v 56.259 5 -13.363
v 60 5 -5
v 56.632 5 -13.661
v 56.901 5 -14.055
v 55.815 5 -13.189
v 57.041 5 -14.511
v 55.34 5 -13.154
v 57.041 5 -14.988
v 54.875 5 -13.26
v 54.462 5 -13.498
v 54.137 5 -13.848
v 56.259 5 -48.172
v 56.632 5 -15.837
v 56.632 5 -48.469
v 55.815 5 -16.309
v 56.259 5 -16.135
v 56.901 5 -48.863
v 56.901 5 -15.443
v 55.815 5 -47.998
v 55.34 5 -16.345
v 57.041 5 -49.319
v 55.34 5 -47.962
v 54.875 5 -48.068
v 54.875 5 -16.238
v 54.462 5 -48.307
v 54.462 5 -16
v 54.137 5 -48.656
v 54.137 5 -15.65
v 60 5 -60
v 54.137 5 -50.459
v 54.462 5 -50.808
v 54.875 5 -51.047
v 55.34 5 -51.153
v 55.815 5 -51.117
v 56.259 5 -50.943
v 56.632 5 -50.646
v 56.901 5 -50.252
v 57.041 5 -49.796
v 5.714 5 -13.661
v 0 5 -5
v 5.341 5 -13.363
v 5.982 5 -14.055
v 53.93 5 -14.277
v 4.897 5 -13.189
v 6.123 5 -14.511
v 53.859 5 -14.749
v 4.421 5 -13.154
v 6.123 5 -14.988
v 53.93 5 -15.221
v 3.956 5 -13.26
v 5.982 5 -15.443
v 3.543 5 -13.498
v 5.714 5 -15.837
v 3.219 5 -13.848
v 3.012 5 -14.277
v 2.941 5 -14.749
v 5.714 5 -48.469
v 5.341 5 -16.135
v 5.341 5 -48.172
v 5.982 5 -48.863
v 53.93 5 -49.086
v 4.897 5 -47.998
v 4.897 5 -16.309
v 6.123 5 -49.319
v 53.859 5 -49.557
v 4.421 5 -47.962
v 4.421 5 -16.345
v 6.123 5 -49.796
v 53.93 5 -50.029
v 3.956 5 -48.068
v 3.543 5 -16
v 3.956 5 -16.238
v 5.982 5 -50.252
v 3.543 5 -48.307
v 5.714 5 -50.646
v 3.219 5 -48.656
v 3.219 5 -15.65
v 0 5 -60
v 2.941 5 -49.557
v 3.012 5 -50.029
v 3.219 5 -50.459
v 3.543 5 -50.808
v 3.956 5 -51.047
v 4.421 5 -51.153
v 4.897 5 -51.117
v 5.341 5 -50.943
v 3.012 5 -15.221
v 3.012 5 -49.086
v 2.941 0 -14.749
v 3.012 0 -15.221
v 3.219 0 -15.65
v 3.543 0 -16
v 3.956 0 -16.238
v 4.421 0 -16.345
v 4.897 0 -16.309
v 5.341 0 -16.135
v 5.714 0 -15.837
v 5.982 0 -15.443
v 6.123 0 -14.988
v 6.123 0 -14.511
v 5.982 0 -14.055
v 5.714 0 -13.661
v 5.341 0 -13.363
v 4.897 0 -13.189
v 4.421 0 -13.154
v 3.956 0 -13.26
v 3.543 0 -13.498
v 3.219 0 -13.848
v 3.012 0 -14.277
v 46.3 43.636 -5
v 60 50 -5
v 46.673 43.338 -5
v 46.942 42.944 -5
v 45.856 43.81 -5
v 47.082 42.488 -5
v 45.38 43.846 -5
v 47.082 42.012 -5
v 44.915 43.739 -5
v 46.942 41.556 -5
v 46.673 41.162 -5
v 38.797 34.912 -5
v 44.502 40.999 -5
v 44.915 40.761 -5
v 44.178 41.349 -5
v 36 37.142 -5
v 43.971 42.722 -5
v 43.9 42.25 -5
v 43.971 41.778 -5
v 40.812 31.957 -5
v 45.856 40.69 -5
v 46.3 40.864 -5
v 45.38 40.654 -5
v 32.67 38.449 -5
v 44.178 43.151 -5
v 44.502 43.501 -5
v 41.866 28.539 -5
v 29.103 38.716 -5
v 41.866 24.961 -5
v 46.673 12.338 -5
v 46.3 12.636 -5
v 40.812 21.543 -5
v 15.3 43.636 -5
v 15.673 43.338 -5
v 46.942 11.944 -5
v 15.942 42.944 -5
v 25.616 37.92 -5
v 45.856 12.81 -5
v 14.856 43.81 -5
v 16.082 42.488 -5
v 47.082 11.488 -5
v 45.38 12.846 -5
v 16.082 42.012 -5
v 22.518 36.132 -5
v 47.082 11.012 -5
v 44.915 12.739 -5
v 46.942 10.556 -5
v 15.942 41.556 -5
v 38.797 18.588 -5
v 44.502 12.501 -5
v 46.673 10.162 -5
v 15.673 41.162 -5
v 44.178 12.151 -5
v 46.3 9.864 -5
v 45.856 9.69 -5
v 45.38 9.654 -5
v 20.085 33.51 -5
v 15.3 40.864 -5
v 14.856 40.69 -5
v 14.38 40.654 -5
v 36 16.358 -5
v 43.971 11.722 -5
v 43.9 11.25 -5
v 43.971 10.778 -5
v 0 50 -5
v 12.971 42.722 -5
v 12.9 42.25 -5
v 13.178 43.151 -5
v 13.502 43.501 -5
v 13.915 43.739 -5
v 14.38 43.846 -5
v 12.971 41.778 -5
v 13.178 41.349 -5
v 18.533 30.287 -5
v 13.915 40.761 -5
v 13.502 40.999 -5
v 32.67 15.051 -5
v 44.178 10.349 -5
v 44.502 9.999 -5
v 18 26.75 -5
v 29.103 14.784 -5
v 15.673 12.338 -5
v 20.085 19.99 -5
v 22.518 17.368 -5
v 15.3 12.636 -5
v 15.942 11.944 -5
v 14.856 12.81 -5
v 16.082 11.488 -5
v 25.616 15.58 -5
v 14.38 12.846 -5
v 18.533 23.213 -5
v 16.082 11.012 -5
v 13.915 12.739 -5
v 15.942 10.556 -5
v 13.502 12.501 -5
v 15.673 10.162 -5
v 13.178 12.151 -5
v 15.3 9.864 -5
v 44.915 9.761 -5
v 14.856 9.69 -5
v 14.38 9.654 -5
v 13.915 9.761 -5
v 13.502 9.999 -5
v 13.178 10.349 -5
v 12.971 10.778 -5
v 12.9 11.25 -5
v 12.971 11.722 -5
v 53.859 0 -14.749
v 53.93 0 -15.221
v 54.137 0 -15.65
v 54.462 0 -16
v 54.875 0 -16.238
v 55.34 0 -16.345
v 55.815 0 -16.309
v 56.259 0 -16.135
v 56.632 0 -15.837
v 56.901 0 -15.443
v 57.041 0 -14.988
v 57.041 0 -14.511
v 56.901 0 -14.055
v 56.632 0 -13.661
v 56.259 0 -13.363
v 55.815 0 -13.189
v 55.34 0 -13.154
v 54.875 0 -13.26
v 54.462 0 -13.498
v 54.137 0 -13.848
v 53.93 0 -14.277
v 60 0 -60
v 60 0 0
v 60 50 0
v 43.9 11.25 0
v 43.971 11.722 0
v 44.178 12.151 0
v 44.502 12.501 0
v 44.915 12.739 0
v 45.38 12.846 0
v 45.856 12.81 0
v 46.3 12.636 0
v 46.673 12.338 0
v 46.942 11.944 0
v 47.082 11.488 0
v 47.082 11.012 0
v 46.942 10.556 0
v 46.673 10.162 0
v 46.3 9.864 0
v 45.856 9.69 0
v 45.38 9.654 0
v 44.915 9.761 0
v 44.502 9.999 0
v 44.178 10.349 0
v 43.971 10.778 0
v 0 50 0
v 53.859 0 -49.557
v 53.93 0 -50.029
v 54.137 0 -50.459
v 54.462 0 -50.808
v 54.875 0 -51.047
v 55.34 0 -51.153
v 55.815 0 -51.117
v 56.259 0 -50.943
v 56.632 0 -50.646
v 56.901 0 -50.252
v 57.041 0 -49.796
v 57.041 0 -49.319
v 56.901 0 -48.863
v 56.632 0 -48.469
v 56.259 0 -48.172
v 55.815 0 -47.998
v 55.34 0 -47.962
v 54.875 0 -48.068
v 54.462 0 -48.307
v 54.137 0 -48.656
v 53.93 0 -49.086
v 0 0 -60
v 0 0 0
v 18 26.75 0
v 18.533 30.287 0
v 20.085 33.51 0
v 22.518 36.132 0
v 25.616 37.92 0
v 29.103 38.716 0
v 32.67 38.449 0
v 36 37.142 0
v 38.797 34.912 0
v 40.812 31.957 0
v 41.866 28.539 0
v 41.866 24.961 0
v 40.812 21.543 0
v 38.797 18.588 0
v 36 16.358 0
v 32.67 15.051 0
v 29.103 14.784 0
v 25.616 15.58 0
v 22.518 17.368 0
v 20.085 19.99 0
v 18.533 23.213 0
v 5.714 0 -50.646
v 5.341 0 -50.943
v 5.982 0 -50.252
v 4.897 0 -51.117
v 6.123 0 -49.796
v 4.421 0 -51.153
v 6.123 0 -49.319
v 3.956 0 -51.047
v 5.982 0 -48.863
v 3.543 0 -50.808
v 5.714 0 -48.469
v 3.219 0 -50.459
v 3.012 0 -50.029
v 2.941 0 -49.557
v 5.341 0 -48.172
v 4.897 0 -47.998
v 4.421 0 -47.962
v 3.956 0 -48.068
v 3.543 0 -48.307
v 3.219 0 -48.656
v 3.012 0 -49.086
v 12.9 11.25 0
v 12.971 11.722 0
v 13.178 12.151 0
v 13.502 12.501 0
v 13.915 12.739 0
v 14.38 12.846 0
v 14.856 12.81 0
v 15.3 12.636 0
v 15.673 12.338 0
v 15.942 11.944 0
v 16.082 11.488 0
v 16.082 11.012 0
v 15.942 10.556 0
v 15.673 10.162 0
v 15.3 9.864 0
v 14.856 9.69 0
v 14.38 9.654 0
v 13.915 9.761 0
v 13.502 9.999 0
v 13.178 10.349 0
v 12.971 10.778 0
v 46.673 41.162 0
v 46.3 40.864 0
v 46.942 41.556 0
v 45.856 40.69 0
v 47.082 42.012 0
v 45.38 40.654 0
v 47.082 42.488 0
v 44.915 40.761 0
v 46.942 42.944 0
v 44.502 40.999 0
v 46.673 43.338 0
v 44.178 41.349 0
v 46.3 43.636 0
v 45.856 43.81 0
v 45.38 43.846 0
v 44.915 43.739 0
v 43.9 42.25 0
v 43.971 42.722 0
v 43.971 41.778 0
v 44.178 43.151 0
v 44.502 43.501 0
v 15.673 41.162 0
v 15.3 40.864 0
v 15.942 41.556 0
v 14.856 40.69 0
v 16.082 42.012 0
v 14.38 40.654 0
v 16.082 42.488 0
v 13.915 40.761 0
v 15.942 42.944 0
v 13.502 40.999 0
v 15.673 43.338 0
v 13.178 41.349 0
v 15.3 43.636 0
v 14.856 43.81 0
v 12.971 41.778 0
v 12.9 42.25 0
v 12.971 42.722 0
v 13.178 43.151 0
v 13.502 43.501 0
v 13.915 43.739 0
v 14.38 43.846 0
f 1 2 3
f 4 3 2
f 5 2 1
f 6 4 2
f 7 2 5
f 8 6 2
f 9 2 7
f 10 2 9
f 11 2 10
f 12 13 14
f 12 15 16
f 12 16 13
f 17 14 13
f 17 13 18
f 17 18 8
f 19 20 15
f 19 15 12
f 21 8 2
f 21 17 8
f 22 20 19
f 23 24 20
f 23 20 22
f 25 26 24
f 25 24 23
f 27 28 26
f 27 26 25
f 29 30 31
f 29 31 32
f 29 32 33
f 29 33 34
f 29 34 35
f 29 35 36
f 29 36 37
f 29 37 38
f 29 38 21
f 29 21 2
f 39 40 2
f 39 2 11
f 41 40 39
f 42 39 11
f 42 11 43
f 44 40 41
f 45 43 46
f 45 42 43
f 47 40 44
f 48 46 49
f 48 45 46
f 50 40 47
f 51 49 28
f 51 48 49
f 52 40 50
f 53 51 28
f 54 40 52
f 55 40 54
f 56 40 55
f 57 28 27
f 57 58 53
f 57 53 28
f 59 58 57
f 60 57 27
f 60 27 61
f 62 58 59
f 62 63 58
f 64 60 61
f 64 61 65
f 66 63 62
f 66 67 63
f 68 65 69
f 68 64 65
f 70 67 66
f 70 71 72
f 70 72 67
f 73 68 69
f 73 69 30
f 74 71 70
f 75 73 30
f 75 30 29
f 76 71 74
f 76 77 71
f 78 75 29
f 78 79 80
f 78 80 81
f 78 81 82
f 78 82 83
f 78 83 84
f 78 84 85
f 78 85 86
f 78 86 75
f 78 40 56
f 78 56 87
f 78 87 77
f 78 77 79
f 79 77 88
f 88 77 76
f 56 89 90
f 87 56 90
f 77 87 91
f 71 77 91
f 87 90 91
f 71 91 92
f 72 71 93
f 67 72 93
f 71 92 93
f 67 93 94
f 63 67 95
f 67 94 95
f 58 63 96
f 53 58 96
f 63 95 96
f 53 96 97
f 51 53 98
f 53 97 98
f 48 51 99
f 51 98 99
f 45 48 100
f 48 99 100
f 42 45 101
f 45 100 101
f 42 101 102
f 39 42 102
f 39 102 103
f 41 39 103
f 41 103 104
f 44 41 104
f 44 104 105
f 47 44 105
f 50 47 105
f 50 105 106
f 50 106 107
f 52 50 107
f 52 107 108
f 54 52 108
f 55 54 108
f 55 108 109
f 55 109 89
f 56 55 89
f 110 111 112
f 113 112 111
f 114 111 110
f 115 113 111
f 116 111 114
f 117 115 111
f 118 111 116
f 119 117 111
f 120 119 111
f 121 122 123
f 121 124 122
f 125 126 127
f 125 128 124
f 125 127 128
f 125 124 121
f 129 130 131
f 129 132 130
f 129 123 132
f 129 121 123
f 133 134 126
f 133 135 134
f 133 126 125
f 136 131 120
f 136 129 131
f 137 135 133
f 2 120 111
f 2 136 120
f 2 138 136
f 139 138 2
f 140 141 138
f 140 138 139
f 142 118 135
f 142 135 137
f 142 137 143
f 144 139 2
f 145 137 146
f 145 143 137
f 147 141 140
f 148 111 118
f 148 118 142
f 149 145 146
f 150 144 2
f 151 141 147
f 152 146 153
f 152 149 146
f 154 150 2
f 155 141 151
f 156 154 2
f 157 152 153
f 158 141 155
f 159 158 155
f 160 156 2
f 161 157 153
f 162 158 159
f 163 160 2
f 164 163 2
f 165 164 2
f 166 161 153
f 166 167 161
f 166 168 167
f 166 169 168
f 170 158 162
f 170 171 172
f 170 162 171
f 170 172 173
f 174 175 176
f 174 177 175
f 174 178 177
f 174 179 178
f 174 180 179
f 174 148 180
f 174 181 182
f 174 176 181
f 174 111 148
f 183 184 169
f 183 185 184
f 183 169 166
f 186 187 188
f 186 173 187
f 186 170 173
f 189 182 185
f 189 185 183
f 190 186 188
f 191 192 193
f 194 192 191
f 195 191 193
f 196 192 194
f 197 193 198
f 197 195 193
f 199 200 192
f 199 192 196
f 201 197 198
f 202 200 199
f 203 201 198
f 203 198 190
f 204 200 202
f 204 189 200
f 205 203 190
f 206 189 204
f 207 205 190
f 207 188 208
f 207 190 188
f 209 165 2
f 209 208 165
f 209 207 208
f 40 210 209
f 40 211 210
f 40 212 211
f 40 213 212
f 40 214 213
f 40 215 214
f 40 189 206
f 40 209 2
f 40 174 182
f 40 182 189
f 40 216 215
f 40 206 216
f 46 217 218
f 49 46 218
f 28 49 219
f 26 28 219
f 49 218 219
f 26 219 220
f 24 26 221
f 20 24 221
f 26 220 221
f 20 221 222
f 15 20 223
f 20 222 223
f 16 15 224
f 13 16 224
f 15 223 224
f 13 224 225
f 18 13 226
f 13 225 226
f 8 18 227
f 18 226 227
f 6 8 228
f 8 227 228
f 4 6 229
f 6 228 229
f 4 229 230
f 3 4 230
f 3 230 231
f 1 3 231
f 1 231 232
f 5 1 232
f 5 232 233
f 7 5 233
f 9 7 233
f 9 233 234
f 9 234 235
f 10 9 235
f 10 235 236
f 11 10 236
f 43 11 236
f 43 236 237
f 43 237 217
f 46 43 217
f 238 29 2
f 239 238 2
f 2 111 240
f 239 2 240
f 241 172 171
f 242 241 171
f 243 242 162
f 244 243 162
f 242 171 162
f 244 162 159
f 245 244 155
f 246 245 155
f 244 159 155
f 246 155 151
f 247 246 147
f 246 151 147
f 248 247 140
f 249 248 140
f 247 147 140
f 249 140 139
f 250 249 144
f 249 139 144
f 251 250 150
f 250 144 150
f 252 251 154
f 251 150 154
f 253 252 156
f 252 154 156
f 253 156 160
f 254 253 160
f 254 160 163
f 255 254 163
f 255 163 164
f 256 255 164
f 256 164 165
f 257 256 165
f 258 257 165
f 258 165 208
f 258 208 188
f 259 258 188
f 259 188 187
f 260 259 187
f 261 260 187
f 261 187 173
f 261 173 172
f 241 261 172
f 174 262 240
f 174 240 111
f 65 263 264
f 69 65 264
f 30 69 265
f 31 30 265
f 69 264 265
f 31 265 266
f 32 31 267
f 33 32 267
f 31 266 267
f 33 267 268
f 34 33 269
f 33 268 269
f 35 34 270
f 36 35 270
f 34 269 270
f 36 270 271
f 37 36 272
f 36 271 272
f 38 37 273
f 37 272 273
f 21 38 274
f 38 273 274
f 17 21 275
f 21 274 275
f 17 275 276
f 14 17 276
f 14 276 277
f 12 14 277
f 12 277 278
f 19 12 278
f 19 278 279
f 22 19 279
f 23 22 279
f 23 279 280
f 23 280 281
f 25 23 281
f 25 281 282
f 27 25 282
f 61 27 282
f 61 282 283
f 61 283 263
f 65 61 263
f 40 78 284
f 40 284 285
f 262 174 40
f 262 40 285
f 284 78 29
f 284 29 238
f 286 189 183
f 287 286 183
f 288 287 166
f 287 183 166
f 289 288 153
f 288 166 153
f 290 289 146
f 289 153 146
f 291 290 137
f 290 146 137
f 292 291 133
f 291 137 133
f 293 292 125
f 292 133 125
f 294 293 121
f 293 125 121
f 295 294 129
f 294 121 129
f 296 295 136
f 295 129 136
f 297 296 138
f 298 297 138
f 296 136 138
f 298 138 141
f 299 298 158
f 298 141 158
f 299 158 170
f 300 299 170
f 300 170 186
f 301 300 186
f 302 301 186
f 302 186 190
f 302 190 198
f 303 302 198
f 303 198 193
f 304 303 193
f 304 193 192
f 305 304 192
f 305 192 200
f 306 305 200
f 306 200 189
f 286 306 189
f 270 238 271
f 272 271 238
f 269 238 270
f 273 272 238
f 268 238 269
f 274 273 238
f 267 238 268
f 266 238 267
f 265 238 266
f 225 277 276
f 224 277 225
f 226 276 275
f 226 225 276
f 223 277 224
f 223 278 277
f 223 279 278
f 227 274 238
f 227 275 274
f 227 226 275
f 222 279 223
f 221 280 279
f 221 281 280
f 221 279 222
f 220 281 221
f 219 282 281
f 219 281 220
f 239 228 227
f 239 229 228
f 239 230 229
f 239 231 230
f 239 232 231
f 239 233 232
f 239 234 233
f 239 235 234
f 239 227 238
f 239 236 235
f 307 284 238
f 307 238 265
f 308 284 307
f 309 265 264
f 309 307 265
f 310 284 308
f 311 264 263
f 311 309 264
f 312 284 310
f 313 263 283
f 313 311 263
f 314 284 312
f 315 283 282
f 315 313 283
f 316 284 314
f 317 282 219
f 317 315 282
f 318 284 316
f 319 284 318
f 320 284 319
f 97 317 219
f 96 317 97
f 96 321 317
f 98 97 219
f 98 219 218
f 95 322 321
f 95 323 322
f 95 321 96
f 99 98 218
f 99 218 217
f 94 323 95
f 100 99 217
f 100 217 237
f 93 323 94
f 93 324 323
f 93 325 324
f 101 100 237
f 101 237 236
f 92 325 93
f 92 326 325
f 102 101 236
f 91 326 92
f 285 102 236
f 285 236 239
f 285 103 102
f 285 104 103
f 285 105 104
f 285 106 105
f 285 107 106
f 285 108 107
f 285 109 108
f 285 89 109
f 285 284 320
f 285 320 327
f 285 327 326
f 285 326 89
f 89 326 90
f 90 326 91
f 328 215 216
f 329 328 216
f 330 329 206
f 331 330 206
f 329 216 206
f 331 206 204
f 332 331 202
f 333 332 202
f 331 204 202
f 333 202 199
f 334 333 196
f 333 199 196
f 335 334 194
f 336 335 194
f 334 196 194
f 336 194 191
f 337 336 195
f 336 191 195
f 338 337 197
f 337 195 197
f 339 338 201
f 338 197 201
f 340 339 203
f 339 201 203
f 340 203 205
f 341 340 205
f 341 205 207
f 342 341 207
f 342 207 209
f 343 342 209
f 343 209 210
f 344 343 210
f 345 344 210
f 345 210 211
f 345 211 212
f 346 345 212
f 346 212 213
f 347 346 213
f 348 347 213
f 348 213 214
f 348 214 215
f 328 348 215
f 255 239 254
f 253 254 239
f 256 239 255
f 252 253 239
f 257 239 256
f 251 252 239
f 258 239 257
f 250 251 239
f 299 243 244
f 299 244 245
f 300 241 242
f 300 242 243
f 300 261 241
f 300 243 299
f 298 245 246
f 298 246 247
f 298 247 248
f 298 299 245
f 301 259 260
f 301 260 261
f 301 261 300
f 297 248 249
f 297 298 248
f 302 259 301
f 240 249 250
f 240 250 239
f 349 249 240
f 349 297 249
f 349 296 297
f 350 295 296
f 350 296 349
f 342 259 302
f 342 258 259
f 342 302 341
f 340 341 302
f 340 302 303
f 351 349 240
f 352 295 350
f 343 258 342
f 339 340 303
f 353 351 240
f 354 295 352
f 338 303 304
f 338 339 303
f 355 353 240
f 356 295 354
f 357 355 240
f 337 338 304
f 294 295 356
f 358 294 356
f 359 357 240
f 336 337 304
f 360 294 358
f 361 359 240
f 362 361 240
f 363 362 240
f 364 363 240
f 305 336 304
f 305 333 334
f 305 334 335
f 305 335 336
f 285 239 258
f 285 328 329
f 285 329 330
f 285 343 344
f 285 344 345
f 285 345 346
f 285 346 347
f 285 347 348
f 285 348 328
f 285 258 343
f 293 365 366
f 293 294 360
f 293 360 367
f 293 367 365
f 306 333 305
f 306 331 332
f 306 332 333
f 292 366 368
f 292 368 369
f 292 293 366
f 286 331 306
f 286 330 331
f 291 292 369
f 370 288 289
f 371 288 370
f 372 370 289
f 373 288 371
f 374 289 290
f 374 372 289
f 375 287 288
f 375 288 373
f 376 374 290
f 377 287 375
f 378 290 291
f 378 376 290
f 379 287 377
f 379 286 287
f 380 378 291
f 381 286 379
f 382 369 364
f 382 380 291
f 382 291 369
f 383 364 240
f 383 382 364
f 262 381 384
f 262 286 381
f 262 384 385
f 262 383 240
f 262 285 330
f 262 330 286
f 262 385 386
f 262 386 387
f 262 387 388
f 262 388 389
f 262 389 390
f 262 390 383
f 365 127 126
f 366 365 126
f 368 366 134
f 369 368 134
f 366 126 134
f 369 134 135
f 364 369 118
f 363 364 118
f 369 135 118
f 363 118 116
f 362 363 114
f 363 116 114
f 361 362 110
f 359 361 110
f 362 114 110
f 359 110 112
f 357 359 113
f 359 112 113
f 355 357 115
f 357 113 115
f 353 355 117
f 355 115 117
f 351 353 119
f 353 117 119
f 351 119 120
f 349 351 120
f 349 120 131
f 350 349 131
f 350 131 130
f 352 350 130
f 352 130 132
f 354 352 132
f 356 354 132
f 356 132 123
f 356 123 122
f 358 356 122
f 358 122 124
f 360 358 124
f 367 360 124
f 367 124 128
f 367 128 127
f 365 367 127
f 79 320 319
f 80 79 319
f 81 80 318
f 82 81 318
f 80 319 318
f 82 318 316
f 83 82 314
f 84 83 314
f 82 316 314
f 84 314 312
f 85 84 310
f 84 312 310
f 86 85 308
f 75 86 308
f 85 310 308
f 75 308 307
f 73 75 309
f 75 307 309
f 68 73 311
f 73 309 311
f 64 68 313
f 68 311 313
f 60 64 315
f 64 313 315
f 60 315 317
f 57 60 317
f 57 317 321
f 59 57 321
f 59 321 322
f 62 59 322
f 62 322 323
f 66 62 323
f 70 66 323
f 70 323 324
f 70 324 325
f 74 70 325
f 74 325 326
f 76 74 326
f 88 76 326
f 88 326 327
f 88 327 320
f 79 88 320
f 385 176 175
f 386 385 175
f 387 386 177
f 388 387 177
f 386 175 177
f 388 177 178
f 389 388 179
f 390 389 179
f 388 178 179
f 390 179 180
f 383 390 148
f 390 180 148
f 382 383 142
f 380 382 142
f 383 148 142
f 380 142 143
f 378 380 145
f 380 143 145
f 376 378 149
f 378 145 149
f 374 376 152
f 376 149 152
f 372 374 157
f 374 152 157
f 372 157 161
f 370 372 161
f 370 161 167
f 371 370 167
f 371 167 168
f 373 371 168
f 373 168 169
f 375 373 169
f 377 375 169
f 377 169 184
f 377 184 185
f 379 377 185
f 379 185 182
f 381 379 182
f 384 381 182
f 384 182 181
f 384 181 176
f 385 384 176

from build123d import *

# Parameters (mm, degrees)
EXTRUDE_1_DEPTH = 60
HOLE_WIZARD_2_D = 24
HOLE_WIZARD_3_D = 3.2
HOLE_WIZARD_4_D = 3.2


with BuildPart() as part:
    # 草图1 → 凸台-拉伸1 (new body)
    with BuildSketch(Plane(origin=(0, 0, 0), x_dir=(0, 0, -1), z_dir=(1, 0, 0))):
        Polygon((0, 0), (0, 50), (5, 50), (5, 5), (60, 5), (60, 0), align=None)
    extrude(amount=EXTRUDE_1_DEPTH)

    # 孔2 (through all)
    with Locations(Plane.XY):
        with Locations((30, 26.75)):
            Hole(HOLE_WIZARD_2_D / 2)

    # 孔3 (through all)
    with Locations(Plane.XY):
        with Locations((14.5, 42.25), (45.5, 42.25), (45.5, 11.25), (14.5, 11.25)):
            Hole(HOLE_WIZARD_3_D / 2)

    # 孔4 (through all)
    with Locations(Plane(origin=(0, 5, 0), x_dir=(1, 0, 0), z_dir=(0, 1, 0))):
        with Locations((55.459259259, 14.749042146), (55.459259259, 49.557471264), (4.540740741, 14.749042146), (4.540740741, 49.557471264)):
            Hole(HOLE_WIZARD_4_D / 2)


solid = part.part
